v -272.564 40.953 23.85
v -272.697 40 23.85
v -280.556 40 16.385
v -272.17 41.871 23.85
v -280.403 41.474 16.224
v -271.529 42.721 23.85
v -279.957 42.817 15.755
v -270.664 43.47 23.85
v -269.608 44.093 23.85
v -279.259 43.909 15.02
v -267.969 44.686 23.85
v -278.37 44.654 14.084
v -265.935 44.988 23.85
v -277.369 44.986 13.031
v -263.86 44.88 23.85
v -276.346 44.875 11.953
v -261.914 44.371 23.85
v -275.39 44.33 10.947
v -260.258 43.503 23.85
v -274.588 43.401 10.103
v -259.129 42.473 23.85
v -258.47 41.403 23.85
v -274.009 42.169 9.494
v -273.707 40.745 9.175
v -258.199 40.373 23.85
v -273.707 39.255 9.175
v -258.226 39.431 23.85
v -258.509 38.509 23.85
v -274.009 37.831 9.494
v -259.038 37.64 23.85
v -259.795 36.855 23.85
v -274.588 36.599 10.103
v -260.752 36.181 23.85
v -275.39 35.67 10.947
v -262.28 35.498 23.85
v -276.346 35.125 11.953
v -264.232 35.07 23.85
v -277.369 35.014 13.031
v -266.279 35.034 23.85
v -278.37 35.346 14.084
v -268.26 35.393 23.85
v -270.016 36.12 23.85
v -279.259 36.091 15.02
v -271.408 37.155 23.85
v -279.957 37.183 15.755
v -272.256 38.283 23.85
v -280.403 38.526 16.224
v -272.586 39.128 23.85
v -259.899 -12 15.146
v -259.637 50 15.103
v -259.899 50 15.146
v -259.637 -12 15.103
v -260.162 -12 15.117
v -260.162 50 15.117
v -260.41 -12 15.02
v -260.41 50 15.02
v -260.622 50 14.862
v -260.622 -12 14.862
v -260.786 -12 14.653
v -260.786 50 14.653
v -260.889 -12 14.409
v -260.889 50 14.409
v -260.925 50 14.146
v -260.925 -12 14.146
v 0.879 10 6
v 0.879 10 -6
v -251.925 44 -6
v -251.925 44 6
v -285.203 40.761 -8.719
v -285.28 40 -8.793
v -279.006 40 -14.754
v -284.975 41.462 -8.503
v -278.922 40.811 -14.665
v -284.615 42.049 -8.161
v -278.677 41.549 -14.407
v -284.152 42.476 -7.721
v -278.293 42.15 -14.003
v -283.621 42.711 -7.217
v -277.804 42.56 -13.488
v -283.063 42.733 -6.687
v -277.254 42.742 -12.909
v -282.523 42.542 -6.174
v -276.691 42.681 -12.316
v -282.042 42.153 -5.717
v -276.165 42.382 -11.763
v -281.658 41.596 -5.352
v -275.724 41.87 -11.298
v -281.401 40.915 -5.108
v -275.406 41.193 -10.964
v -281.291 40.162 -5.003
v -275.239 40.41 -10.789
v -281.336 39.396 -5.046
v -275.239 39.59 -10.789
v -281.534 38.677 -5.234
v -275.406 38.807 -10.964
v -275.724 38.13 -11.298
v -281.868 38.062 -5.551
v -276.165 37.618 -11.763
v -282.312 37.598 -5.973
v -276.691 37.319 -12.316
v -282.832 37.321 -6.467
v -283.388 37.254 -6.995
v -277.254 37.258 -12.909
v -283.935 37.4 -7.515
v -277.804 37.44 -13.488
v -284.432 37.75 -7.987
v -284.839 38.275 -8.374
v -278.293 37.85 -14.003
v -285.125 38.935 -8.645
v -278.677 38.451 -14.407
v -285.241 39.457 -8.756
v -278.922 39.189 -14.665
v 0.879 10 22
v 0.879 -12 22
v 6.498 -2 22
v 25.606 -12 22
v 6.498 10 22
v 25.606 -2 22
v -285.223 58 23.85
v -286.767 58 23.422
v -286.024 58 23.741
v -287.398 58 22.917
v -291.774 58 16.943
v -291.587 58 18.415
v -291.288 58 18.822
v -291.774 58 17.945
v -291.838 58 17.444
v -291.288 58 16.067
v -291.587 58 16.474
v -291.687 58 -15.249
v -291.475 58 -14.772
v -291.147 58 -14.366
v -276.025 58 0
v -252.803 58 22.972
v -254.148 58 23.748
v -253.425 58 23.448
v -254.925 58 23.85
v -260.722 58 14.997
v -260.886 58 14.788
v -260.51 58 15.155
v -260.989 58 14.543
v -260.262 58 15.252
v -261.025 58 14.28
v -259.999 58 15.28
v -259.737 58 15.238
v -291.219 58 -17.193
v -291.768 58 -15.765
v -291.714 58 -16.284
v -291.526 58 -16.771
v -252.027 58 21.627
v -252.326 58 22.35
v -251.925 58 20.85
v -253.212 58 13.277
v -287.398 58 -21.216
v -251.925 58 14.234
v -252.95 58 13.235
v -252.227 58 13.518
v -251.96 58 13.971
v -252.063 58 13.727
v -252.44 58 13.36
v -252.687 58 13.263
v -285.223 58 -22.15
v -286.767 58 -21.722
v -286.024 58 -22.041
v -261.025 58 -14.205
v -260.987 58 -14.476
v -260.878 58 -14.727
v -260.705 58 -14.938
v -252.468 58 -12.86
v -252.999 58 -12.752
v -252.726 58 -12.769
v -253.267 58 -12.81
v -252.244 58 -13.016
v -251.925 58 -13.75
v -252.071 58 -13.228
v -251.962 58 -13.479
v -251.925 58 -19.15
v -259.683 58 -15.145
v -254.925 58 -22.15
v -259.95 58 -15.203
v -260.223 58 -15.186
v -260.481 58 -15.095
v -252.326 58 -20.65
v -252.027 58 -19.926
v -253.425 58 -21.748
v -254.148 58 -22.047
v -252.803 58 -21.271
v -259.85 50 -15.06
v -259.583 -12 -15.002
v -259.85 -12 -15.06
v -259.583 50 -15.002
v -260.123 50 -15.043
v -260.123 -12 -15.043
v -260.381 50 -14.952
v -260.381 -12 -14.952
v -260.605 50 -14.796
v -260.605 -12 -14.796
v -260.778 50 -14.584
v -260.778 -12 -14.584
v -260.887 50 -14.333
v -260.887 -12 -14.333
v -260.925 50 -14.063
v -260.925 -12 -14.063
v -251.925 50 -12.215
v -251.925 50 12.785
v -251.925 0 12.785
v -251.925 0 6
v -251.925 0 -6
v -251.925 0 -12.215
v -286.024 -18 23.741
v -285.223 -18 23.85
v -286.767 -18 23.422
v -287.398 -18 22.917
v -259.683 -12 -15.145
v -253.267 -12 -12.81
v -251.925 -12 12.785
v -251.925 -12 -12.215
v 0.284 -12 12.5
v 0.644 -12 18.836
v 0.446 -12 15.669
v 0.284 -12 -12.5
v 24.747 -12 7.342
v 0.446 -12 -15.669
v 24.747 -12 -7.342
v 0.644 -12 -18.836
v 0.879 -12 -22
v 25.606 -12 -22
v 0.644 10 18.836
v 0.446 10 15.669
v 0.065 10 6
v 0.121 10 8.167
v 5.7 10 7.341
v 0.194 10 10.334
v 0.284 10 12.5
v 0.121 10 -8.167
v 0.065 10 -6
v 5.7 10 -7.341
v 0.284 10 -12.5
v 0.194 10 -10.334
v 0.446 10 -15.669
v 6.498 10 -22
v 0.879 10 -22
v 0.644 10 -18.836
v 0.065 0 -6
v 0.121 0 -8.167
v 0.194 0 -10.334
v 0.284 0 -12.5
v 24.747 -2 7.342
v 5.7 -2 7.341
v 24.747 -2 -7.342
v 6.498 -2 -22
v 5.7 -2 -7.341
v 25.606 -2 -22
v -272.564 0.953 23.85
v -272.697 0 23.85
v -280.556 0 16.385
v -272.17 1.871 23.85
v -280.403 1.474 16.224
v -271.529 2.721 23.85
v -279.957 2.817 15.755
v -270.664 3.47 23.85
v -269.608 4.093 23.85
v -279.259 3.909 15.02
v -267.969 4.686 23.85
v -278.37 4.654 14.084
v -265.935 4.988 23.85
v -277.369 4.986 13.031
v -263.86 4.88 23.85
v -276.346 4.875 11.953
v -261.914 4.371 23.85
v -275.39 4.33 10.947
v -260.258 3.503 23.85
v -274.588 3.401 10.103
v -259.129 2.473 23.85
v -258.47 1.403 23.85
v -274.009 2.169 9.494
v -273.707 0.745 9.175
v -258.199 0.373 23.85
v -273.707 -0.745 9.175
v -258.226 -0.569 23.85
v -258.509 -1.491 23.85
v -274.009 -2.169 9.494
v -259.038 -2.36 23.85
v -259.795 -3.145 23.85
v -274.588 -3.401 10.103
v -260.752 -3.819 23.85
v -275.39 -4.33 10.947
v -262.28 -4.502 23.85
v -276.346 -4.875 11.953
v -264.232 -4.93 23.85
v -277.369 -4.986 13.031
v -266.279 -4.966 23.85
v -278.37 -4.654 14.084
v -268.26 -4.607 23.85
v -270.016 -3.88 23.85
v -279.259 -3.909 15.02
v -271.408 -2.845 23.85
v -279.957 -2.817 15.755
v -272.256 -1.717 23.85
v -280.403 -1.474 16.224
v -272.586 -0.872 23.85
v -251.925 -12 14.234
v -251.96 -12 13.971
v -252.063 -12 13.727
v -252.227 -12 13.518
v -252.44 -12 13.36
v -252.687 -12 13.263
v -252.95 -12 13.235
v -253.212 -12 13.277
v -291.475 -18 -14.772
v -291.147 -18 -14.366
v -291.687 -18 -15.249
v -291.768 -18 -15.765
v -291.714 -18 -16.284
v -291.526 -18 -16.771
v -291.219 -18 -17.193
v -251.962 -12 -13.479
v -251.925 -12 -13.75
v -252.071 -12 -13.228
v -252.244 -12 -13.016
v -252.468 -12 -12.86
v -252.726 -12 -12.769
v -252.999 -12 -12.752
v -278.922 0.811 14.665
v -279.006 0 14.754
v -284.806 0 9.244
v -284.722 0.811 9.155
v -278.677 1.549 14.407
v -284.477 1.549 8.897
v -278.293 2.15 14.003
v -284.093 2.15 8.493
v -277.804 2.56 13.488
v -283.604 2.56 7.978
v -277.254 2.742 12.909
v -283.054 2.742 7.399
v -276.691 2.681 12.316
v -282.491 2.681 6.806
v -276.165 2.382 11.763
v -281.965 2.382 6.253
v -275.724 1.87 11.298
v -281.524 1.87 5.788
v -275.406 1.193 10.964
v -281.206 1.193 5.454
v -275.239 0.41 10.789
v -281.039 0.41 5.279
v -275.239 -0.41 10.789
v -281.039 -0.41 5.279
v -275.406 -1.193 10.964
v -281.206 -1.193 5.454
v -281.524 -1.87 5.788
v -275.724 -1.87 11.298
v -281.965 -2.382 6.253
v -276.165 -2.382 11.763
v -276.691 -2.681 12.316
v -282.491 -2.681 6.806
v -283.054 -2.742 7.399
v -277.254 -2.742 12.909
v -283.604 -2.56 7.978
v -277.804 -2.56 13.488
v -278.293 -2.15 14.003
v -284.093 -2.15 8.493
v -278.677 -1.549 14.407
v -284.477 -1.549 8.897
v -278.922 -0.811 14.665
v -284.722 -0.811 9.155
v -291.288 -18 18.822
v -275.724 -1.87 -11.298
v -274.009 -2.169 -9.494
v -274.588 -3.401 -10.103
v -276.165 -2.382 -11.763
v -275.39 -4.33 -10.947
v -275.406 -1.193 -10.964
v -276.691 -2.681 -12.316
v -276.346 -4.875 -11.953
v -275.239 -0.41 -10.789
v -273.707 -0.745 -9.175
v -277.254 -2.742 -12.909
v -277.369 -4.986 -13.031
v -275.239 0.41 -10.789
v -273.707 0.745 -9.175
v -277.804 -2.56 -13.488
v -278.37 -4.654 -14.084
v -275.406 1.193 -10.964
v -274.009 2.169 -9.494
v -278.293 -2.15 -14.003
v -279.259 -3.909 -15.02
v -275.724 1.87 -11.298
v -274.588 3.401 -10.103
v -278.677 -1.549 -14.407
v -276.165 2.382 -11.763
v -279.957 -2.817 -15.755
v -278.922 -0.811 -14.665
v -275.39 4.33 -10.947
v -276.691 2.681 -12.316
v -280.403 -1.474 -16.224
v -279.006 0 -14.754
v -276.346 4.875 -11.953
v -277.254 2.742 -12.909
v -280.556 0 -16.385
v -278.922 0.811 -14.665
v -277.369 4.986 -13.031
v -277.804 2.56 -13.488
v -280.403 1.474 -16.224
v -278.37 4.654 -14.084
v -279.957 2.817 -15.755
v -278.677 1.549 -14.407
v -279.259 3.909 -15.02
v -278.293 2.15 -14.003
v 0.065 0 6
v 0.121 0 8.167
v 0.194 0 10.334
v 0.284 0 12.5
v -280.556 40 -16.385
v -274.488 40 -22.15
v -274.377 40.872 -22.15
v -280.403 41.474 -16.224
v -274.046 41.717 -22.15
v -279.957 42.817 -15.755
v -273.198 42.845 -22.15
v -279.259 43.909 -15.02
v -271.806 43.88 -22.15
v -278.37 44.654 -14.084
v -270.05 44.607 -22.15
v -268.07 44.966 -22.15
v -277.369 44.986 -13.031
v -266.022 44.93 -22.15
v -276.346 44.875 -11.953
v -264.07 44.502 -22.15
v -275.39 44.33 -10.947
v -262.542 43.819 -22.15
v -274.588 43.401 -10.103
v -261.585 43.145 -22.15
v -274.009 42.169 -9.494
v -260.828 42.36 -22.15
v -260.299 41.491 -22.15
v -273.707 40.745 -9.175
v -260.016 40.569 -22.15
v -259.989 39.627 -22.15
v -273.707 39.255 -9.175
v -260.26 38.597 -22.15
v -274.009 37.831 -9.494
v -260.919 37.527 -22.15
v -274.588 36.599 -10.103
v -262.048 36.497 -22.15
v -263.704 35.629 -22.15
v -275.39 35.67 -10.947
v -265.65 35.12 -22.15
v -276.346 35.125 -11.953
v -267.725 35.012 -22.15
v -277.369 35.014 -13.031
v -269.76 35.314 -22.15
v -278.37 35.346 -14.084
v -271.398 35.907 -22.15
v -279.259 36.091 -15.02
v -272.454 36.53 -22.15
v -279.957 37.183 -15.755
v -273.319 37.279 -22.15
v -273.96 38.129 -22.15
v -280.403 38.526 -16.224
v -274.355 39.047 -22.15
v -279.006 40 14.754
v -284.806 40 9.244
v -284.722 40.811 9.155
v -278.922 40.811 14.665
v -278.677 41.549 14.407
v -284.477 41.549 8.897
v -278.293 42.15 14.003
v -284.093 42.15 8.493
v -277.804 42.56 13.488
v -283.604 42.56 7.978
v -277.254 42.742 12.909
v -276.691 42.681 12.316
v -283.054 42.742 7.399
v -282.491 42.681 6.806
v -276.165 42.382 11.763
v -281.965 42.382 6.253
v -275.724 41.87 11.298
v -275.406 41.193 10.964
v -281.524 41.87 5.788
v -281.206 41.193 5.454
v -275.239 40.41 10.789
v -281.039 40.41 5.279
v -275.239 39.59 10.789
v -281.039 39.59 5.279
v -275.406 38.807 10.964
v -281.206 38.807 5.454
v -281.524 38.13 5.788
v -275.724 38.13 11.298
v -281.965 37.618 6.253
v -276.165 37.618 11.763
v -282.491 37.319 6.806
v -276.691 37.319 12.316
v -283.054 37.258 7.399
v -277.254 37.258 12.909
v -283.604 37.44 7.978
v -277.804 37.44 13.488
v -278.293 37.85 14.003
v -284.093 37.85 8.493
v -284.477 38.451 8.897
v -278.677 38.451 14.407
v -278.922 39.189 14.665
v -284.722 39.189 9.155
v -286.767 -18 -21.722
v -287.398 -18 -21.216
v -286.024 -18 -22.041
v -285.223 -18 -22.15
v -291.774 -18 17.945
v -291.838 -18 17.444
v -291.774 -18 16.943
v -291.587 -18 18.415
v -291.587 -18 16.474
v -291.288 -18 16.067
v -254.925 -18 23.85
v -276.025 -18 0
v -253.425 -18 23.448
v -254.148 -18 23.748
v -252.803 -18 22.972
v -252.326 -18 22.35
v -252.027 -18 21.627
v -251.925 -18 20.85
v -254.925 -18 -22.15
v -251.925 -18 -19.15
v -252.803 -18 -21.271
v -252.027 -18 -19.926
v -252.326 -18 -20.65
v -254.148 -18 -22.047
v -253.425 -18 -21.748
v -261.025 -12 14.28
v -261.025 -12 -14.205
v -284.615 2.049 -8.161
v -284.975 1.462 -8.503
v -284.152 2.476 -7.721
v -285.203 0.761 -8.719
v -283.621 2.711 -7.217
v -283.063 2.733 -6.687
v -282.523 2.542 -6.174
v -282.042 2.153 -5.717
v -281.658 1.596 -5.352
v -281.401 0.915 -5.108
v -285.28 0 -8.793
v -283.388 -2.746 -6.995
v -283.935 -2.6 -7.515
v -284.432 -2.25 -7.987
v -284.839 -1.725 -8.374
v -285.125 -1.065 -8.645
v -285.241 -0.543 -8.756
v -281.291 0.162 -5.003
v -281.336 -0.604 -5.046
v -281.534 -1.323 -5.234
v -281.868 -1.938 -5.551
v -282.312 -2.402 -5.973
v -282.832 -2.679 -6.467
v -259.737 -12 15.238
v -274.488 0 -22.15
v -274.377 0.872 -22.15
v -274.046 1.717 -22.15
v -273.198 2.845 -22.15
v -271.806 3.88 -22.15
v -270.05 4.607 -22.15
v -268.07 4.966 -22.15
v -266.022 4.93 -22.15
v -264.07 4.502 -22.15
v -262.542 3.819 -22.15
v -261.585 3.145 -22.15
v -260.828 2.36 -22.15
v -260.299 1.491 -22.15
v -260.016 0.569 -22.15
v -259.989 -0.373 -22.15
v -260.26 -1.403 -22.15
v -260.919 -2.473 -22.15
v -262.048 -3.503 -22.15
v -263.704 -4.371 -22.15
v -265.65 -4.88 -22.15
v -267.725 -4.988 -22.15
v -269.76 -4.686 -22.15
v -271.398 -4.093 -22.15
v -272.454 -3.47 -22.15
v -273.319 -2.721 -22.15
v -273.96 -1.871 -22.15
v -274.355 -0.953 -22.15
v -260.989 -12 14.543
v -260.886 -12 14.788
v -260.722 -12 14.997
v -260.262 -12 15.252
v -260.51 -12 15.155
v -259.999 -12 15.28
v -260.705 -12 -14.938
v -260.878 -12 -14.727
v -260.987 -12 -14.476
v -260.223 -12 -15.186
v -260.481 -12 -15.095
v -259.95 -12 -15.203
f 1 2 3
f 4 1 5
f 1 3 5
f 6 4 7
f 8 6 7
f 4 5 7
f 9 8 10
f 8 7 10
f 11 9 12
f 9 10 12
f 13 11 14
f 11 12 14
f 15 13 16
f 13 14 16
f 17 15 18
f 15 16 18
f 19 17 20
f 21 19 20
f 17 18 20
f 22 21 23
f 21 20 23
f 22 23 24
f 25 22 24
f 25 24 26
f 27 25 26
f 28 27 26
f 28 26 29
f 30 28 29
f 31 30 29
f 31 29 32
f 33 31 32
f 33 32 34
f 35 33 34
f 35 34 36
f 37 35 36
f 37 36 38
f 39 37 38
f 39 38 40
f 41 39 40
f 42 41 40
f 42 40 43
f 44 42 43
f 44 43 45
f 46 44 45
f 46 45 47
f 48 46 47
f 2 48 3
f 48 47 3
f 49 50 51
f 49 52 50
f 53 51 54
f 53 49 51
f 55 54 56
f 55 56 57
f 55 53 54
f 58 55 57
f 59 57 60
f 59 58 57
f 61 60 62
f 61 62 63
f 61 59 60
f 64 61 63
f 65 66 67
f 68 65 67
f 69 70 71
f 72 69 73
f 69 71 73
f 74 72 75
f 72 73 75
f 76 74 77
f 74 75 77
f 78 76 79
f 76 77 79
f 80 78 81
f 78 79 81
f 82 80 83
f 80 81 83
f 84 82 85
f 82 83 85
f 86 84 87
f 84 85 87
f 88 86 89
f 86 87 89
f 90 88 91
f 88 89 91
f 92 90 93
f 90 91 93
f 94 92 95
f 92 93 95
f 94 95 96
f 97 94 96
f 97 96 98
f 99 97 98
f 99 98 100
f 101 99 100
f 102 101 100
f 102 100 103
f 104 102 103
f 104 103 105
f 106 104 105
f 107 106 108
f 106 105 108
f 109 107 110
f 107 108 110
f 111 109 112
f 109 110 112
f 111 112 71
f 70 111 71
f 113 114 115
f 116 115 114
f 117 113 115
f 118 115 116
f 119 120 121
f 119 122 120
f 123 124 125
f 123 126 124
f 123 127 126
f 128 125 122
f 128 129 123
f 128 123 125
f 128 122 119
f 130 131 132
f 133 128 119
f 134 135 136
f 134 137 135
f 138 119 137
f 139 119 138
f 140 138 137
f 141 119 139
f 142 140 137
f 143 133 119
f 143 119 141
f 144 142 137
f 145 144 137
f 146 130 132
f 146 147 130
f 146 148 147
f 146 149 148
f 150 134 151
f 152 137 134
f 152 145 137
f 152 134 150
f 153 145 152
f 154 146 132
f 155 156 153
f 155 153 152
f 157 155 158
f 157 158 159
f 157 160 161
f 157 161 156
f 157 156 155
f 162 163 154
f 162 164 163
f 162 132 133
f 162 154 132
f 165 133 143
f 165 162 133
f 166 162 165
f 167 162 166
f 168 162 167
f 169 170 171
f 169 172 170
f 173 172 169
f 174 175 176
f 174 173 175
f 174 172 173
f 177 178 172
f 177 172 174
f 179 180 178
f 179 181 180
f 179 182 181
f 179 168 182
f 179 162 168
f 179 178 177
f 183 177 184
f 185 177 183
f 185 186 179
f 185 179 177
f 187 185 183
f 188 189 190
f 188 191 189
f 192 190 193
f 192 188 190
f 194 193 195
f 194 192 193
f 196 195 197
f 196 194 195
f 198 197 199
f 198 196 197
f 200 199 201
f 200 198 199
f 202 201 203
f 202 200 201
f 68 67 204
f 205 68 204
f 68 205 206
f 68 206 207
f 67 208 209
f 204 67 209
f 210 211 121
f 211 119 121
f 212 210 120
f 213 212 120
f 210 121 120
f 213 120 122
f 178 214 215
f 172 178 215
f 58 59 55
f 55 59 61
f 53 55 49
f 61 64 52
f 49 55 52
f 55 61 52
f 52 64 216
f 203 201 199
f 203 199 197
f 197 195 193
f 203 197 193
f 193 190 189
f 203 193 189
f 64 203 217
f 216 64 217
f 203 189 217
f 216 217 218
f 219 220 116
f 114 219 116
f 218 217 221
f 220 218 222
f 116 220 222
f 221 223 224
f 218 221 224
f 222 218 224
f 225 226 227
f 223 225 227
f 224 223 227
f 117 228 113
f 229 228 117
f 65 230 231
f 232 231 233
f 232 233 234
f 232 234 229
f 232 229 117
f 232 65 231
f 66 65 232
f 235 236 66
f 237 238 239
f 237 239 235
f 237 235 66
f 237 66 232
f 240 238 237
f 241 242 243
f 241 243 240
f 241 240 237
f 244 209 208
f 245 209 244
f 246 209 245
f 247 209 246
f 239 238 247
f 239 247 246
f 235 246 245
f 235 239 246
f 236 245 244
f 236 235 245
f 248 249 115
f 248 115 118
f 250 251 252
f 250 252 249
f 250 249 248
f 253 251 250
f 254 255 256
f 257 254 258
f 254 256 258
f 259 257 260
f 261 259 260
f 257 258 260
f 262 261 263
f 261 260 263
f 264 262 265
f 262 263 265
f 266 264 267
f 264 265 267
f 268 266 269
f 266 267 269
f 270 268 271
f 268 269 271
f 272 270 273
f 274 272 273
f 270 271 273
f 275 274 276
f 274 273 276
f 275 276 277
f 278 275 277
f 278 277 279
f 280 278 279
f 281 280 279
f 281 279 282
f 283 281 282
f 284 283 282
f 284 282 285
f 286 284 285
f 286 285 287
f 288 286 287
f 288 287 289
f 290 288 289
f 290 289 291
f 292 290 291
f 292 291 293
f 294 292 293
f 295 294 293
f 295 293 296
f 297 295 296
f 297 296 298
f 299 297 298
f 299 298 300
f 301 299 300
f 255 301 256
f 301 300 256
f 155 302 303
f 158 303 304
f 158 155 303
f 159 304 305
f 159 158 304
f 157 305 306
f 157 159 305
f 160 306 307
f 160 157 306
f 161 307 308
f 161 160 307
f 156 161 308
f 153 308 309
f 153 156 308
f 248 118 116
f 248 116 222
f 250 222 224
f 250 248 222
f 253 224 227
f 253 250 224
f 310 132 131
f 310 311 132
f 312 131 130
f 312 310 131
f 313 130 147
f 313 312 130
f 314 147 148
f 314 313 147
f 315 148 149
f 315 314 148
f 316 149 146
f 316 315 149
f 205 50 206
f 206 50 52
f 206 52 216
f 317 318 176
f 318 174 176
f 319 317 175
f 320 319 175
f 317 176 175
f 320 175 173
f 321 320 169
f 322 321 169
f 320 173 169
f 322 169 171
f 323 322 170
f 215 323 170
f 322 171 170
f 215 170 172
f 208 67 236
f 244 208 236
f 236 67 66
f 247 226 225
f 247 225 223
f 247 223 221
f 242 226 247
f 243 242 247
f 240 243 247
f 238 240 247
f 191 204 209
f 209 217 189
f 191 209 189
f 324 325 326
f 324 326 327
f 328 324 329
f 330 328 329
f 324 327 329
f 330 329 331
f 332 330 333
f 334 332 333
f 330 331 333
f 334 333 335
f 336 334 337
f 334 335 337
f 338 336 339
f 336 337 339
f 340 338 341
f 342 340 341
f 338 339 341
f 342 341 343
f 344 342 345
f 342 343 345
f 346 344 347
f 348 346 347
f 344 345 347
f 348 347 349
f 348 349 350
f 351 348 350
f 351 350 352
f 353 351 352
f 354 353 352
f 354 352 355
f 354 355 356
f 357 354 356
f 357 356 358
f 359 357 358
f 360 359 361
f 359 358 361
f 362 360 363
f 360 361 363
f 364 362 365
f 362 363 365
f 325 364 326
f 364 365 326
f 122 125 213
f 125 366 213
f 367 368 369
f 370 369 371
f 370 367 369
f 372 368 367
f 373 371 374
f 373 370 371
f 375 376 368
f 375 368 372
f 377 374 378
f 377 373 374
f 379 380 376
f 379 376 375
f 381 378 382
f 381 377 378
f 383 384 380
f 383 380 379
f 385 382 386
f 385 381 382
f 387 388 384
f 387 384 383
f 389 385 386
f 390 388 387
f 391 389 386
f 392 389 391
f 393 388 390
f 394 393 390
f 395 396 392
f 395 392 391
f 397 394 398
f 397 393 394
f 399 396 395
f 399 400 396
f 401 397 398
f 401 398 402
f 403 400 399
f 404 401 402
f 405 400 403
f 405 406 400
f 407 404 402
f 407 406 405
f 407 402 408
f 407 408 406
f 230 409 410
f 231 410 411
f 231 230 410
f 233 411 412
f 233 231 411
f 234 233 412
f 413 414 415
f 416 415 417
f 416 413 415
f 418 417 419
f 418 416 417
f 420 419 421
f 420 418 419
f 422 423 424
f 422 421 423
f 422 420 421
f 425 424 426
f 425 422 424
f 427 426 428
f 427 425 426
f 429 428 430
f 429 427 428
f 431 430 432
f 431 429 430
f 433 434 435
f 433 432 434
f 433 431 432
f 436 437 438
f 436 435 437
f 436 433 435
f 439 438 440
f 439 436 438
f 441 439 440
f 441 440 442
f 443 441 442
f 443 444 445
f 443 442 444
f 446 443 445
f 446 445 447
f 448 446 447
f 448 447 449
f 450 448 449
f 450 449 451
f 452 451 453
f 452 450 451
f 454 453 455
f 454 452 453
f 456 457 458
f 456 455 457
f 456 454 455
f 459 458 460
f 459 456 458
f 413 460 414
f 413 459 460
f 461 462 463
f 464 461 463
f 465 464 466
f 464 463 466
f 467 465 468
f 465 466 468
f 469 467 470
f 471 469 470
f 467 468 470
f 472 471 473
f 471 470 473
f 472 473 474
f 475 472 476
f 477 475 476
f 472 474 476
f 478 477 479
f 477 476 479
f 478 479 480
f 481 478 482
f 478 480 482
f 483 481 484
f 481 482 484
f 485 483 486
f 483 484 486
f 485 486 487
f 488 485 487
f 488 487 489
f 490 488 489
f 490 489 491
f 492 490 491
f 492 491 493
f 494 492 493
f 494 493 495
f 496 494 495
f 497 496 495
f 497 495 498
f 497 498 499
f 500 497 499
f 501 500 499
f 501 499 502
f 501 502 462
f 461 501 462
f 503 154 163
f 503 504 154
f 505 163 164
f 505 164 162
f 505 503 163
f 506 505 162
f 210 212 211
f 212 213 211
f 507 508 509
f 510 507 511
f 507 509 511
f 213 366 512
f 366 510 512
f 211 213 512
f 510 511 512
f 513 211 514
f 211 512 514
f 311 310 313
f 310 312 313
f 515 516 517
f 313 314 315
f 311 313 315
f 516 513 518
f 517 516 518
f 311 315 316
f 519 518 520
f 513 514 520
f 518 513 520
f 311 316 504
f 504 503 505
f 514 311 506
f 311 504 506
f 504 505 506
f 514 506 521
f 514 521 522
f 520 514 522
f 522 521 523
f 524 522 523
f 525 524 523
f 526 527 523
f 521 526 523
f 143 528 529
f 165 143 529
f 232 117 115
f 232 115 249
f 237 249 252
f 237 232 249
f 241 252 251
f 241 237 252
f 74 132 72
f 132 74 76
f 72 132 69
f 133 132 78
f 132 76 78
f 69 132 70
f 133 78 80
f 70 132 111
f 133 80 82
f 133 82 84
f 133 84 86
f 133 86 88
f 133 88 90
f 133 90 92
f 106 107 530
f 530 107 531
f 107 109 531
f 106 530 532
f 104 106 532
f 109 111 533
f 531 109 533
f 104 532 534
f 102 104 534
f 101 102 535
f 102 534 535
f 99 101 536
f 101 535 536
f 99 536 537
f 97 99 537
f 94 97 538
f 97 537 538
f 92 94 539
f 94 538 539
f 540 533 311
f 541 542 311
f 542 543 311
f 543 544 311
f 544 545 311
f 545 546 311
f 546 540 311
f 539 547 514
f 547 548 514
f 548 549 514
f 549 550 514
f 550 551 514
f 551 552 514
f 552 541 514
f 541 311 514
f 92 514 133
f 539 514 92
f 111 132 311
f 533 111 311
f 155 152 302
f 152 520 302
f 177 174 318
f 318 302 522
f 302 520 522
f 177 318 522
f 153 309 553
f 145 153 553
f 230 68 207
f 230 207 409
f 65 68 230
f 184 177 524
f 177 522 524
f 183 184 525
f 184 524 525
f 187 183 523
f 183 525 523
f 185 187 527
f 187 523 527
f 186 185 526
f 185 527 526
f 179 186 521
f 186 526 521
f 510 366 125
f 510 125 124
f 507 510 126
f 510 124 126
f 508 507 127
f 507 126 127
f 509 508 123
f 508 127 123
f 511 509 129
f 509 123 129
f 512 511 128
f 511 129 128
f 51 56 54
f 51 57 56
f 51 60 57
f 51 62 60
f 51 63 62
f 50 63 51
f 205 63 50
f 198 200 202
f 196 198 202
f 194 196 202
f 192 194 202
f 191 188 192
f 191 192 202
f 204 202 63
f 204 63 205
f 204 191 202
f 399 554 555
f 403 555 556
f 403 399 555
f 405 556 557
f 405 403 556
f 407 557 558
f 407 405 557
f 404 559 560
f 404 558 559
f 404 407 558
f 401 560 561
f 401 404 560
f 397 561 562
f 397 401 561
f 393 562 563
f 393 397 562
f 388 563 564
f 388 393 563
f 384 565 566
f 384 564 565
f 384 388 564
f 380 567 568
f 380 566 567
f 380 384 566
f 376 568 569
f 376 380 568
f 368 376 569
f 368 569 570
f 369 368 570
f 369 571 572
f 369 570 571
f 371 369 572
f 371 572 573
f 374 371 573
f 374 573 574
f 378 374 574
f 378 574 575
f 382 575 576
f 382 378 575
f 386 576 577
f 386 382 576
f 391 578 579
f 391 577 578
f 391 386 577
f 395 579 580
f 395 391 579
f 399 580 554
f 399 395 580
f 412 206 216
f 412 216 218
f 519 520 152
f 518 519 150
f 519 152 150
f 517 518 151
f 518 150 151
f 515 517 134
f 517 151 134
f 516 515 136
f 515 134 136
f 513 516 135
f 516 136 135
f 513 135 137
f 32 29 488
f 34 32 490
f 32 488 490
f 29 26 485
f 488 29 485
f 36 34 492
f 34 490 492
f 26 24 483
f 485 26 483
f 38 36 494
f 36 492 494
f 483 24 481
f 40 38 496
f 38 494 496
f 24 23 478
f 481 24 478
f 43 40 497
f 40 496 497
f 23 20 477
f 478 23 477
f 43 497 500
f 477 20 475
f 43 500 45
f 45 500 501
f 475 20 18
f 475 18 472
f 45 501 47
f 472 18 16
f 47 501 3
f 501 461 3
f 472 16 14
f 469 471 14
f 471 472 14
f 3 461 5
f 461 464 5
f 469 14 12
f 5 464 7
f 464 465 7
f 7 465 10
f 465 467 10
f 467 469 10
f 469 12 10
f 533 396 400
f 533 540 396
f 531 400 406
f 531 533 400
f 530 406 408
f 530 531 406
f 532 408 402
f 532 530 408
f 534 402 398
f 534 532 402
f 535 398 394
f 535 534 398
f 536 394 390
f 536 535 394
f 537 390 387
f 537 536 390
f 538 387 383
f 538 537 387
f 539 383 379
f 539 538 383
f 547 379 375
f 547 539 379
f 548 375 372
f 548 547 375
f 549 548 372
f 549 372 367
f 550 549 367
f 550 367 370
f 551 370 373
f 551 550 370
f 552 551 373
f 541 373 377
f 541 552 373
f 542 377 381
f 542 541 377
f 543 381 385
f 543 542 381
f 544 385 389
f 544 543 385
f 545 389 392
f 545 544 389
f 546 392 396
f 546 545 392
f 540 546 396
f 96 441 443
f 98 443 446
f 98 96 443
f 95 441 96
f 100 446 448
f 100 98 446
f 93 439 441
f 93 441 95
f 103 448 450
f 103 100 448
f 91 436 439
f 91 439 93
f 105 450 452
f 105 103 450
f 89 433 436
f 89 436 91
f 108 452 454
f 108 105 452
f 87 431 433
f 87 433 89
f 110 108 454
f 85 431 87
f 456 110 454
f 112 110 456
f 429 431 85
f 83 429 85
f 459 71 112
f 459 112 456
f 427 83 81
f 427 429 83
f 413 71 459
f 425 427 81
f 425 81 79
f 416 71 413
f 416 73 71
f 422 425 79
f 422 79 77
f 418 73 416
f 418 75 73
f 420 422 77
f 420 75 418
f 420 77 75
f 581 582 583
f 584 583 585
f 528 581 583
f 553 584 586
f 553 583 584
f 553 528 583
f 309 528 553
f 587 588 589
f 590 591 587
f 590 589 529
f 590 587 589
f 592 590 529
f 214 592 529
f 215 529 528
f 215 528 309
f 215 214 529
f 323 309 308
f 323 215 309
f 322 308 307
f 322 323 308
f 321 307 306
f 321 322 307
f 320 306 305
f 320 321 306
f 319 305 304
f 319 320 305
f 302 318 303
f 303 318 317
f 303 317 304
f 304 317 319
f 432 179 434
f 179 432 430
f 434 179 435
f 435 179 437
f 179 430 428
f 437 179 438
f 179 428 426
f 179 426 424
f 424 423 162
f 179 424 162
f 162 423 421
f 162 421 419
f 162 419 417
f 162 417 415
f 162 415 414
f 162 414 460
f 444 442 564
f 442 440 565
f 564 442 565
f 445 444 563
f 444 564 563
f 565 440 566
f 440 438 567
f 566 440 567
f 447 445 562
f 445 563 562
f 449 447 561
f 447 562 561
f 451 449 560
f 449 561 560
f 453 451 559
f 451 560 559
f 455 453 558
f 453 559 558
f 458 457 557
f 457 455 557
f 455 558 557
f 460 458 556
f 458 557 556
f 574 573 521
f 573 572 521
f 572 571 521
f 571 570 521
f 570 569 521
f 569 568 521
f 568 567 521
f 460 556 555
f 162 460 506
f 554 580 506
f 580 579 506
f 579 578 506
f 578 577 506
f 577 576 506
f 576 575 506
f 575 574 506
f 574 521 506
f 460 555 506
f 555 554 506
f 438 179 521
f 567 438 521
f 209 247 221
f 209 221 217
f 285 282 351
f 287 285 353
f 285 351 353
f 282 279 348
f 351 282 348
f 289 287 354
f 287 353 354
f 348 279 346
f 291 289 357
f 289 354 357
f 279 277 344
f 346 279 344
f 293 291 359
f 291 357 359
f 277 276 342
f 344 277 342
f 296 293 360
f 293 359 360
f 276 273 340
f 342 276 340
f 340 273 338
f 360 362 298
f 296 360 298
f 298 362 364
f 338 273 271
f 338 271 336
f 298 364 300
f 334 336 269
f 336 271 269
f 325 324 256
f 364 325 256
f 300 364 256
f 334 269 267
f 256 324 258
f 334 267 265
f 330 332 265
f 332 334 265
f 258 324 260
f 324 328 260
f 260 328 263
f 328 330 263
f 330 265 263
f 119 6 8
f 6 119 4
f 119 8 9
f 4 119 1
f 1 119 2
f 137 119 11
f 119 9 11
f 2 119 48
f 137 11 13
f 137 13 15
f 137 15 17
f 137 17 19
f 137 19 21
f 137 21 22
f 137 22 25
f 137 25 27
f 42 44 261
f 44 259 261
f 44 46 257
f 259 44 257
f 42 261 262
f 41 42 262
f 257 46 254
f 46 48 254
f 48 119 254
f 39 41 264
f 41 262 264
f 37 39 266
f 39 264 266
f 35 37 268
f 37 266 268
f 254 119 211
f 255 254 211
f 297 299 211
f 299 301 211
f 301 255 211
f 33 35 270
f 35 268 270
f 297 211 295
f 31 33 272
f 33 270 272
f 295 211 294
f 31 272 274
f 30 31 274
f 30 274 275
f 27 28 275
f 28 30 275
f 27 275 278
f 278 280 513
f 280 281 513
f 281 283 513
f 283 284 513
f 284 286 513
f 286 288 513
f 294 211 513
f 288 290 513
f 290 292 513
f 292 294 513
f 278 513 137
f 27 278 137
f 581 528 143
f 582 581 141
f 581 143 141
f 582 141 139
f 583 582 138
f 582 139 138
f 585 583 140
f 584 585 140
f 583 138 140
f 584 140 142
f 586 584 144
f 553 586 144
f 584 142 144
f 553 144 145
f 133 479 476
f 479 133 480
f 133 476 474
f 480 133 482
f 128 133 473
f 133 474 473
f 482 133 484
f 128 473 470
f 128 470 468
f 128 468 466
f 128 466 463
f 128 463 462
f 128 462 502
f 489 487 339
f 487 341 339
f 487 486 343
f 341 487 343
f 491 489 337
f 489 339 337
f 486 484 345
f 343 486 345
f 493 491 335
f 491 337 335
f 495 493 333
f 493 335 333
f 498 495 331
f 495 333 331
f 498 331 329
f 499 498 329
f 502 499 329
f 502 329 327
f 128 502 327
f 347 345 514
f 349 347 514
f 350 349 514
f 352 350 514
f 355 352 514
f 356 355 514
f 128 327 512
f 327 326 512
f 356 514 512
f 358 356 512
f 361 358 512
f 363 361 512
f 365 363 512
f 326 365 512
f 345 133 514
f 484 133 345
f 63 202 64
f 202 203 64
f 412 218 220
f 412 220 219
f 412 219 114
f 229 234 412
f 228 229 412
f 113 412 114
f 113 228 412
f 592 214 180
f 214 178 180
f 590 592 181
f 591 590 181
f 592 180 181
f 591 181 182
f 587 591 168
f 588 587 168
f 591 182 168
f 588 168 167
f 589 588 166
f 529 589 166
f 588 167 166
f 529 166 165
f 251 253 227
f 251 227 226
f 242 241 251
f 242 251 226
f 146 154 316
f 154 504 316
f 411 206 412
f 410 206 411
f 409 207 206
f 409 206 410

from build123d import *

# Parameters (mm, degrees)
BOSS_EXTRUDE2_DEPTH       = 12
BOSS_EXTRUDE3_START       = -2
BOSS_EXTRUDE3_DEPTH       = 10
BOSS_EXTRUDE4_START       = 10
BOSS_EXTRUDE4_DEPTH       = 22
BOSS_EXTRUDE5_START       = -12
BOSS_EXTRUDE5_DEPTH       = 6
BOSS_EXTRUDE6_START       = -12
BOSS_EXTRUDE6_DEPTH       = 70
BOSS_EXTRUDE7_DEPTH       = 50
BOSS_EXTRUDE17_DEPTH      = 6
BOSS_EXTRUDE17_DEPTH_BACK = 6
CUT_EXTRUDE1_START        = -8
SKETCH5_R                 = 5
CUT_EXTRUDE1_DEPTH        = 235.157775221
SKETCH5_3_R               = 2.75
CUT_EXTRUDE2_DEPTH        = 243.157775221
FILLET1_R                 = 1
FILLET2_R                 = 1
FILLET3_R                 = 3
FILLET4_R                 = 2


with BuildPart() as part:
    # Sketch2 → Boss-Extrude2 (new body)
    with BuildSketch(Plane(origin=(0, 0, 0), x_dir=(1, 0, 0), z_dir=(0, 1, 0))):
        with BuildLine():
            Line((-260.92456554, 15.490671542), (-260.92456554, -15.490671542))
            Line((-260.92456554, -15.490671542), (-251.92456554, -12.785060566))
            Line((-251.92456554, -12.785060566), (0.283618359, -12.5))
            ThreePointArc((0.283618359, -12.5), (0.540536002, -17.252572707), (0.879487479, -22))
            Line((0.879487479, -22), (6.497788935, -22))
            ThreePointArc((6.497788935, -22), (5.6, 0), (6.497788935, 22))
            Line((6.497788935, 22), (0.879487479, 22))
            ThreePointArc((0.879487479, 22), (0.540536002, 17.252572707), (0.283618359, 12.5))
            Line((0.283618359, 12.5), (-251.92456554, 12.214939434))
            Line((-251.92456554, 12.214939434), (-260.92456554, 15.490671542))
        make_face()
    extrude(amount=-BOSS_EXTRUDE2_DEPTH)

    # Sketch2<5> → Boss-Extrude3 (add)
    with BuildSketch(Plane(origin=(0, 0, 0), x_dir=(1, 0, 0), z_dir=(0, 1, 0)).offset(BOSS_EXTRUDE3_START)):
        with BuildLine():
            Line((25.606156876, 22), (6.497788935, 22))
            ThreePointArc((6.497788935, 22), (5.6, 0), (6.497788935, -22))
            Line((6.497788935, -22), (25.606156876, -22))
            ThreePointArc((25.606156876, -22), (24.64, 0), (25.606156876, 22))
        make_face()
    extrude(amount=-BOSS_EXTRUDE3_DEPTH)

    # Sketch2<6> → Boss-Extrude4 (add)
    with BuildSketch(Plane(origin=(0, 0, 0), x_dir=(1, 0, 0), z_dir=(0, 1, 0)).offset(BOSS_EXTRUDE4_START)):
        with BuildLine():
            ThreePointArc((0.879487479, 22), (0.540536002, 17.252572707), (0.283618359, 12.5))
            ThreePointArc((0.283618359, 12.5), (0, 0), (0.283618359, -12.5))
            ThreePointArc((0.283618359, -12.5), (0.540536002, -17.252572707), (0.879487479, -22))
            Line((0.879487479, -22), (6.497788935, -22))
            ThreePointArc((6.497788935, -22), (5.6, 0), (6.497788935, 22))
            Line((6.497788935, 22), (0.879487479, 22))
        make_face()
    extrude(amount=-BOSS_EXTRUDE4_DEPTH)

    # Sketch2<9> → Boss-Extrude7 (add)
    with BuildSketch(Plane(origin=(0, 0, 0), x_dir=(1, 0, 0), z_dir=(0, 1, 0))):
        Polygon((-251.92456554, 12.214939434), (-260.92456554, 12.204767103), (-260.92456554, -12.795232897), (-251.92456554, -12.785060566), align=None)
        Polygon((-260.92456554, 15.490671542), (-260.92456554, 12.204767103), (-251.92456554, 12.214939434), align=None)
        Polygon((-251.92456554, -12.785060566), (-260.92456554, -12.795232897), (-260.92456554, -15.490671542), align=None)
    extrude(amount=BOSS_EXTRUDE7_DEPTH)

    # Sketch4 → Boss-Extrude17 (add, two sides: drawn at the far end of the back side and taken through both)
    with BuildSketch(Plane.XY.offset(-BOSS_EXTRUDE17_DEPTH_BACK)):
        Polygon((0.879487479, 10), (-251.92456554, 44), (-251.92456554, 0), (0.879487479, 0), align=None)
    extrude(amount=BOSS_EXTRUDE17_DEPTH + BOSS_EXTRUDE17_DEPTH_BACK)

    # Fillet2
    fillet2_edges = [part.edges().sort_by_distance(p)[0] for p in [
        (-260.92456554, 19, 15.490671542),
        (-260.92456554, 19, -15.490671542),
    ]]
    fillet(fillet2_edges, radius=FILLET2_R)


with BuildPart() as body_2:
    # Sketch2<7> → Boss-Extrude5 (new body)
    with BuildSketch(Plane(origin=(0, 0, 0), x_dir=(1, 0, 0), z_dir=(0, 1, 0)).offset(BOSS_EXTRUDE5_START)):
        Polygon((-251.92456554, -23.850407561), (-251.92456554, 22.149592439), (-286.510767905, 22.149592439), (-292.596610314, 15.743442535), (-276.02456554, 0), (-292.596610314, -17.444257657), (-286.510767905, -23.850407561), align=None)
    extrude(amount=-BOSS_EXTRUDE5_DEPTH)

    # Sketch2<8> → Boss-Extrude6 (add)
    with BuildSketch(Plane(origin=(0, 0, 0), x_dir=(1, 0, 0), z_dir=(0, 1, 0)).offset(BOSS_EXTRUDE6_START)):
        Polygon((-292.596610314, 15.743442535), (-276.02456554, 0), (-292.596610314, -17.444257657), (-286.510767905, -23.850407561), (-251.92456554, -23.850407561), (-251.92456554, -12.889481563), (-261.02456554, -15.625154883), (-261.02456554, 15.633486343), (-251.92456554, 12.321357211), (-251.92456554, 22.149592439), (-286.510767905, 22.149592439), align=None)
    extrude(amount=BOSS_EXTRUDE6_DEPTH)

    # Sketch5 → Cut-Extrude1 (cut, through all)
    with BuildSketch(Plane(origin=(-145.085185566, 0, -137.830926288), x_dir=(-0.6887494619146907, 0, 0.724999433594416), z_dir=(-0.724999433594416, 0, -0.6887494619146907)).offset(CUT_EXTRUDE1_START)):
        with Locations((200.111770991, 40)):
            Circle(SKETCH5_R)
        with Locations((200.111770991, 0)):
            Circle(SKETCH5_R)
    cut_extrude1 = extrude(amount=-CUT_EXTRUDE1_DEPTH, mode=Mode.SUBTRACT)

    # Sketch5<3> → Cut-Extrude2 (cut, symmetric)
    with BuildSketch(Plane(origin=(-145.085185566, 0, -137.830926288), x_dir=(-0.6887494619146907, 0, 0.724999433594416), z_dir=(-0.724999433594416, 0, -0.6887494619146907))):
        with Locations((200.111770991, 40)):
            Circle(SKETCH5_3_R)
        with Locations((200.111770991, 0)):
            Circle(SKETCH5_3_R)
    cut_extrude2 = extrude(amount=CUT_EXTRUDE2_DEPTH, both=True, mode=Mode.SUBTRACT)

    # Mirror1: Cut-Extrude1, Cut-Extrude2 across plane
    add(cut_extrude1.mirror(Plane.XY), mode=Mode.SUBTRACT)
    add(cut_extrude2.mirror(Plane.XY), mode=Mode.SUBTRACT)

    # Fillet1
    fillet1_edges = [body_2.edges().sort_by_distance(p)[0] for p in [
        (-251.92456554, 23, 12.889481563),
        (-261.02456554, 23, 15.625154883),
        (-261.02456554, 23, -15.633486343),
        (-251.92456554, 23, -12.321357211),
    ]]
    fillet(fillet1_edges, radius=FILLET1_R)

    # Fillet3
    fillet3_edges = [body_2.edges().sort_by_distance(p)[0] for p in [
        (-251.92456554, 20, 23.850407561),
        (-251.92456554, 20, -22.149592439),
        (-286.510767905, 20, -22.149592439),
        (-286.510767905, 20, 23.850407561),
    ]]
    fillet(fillet3_edges, radius=FILLET3_R)

    # Fillet4
    fillet4_edges = [body_2.edges().sort_by_distance(p)[0] for p in [
        (-292.596610314, 20, -15.743442535),
        (-292.596610314, 20, 17.444257657),
    ]]
    fillet(fillet4_edges, radius=FILLET4_R)


solid = Compound([part.part, body_2.part])
